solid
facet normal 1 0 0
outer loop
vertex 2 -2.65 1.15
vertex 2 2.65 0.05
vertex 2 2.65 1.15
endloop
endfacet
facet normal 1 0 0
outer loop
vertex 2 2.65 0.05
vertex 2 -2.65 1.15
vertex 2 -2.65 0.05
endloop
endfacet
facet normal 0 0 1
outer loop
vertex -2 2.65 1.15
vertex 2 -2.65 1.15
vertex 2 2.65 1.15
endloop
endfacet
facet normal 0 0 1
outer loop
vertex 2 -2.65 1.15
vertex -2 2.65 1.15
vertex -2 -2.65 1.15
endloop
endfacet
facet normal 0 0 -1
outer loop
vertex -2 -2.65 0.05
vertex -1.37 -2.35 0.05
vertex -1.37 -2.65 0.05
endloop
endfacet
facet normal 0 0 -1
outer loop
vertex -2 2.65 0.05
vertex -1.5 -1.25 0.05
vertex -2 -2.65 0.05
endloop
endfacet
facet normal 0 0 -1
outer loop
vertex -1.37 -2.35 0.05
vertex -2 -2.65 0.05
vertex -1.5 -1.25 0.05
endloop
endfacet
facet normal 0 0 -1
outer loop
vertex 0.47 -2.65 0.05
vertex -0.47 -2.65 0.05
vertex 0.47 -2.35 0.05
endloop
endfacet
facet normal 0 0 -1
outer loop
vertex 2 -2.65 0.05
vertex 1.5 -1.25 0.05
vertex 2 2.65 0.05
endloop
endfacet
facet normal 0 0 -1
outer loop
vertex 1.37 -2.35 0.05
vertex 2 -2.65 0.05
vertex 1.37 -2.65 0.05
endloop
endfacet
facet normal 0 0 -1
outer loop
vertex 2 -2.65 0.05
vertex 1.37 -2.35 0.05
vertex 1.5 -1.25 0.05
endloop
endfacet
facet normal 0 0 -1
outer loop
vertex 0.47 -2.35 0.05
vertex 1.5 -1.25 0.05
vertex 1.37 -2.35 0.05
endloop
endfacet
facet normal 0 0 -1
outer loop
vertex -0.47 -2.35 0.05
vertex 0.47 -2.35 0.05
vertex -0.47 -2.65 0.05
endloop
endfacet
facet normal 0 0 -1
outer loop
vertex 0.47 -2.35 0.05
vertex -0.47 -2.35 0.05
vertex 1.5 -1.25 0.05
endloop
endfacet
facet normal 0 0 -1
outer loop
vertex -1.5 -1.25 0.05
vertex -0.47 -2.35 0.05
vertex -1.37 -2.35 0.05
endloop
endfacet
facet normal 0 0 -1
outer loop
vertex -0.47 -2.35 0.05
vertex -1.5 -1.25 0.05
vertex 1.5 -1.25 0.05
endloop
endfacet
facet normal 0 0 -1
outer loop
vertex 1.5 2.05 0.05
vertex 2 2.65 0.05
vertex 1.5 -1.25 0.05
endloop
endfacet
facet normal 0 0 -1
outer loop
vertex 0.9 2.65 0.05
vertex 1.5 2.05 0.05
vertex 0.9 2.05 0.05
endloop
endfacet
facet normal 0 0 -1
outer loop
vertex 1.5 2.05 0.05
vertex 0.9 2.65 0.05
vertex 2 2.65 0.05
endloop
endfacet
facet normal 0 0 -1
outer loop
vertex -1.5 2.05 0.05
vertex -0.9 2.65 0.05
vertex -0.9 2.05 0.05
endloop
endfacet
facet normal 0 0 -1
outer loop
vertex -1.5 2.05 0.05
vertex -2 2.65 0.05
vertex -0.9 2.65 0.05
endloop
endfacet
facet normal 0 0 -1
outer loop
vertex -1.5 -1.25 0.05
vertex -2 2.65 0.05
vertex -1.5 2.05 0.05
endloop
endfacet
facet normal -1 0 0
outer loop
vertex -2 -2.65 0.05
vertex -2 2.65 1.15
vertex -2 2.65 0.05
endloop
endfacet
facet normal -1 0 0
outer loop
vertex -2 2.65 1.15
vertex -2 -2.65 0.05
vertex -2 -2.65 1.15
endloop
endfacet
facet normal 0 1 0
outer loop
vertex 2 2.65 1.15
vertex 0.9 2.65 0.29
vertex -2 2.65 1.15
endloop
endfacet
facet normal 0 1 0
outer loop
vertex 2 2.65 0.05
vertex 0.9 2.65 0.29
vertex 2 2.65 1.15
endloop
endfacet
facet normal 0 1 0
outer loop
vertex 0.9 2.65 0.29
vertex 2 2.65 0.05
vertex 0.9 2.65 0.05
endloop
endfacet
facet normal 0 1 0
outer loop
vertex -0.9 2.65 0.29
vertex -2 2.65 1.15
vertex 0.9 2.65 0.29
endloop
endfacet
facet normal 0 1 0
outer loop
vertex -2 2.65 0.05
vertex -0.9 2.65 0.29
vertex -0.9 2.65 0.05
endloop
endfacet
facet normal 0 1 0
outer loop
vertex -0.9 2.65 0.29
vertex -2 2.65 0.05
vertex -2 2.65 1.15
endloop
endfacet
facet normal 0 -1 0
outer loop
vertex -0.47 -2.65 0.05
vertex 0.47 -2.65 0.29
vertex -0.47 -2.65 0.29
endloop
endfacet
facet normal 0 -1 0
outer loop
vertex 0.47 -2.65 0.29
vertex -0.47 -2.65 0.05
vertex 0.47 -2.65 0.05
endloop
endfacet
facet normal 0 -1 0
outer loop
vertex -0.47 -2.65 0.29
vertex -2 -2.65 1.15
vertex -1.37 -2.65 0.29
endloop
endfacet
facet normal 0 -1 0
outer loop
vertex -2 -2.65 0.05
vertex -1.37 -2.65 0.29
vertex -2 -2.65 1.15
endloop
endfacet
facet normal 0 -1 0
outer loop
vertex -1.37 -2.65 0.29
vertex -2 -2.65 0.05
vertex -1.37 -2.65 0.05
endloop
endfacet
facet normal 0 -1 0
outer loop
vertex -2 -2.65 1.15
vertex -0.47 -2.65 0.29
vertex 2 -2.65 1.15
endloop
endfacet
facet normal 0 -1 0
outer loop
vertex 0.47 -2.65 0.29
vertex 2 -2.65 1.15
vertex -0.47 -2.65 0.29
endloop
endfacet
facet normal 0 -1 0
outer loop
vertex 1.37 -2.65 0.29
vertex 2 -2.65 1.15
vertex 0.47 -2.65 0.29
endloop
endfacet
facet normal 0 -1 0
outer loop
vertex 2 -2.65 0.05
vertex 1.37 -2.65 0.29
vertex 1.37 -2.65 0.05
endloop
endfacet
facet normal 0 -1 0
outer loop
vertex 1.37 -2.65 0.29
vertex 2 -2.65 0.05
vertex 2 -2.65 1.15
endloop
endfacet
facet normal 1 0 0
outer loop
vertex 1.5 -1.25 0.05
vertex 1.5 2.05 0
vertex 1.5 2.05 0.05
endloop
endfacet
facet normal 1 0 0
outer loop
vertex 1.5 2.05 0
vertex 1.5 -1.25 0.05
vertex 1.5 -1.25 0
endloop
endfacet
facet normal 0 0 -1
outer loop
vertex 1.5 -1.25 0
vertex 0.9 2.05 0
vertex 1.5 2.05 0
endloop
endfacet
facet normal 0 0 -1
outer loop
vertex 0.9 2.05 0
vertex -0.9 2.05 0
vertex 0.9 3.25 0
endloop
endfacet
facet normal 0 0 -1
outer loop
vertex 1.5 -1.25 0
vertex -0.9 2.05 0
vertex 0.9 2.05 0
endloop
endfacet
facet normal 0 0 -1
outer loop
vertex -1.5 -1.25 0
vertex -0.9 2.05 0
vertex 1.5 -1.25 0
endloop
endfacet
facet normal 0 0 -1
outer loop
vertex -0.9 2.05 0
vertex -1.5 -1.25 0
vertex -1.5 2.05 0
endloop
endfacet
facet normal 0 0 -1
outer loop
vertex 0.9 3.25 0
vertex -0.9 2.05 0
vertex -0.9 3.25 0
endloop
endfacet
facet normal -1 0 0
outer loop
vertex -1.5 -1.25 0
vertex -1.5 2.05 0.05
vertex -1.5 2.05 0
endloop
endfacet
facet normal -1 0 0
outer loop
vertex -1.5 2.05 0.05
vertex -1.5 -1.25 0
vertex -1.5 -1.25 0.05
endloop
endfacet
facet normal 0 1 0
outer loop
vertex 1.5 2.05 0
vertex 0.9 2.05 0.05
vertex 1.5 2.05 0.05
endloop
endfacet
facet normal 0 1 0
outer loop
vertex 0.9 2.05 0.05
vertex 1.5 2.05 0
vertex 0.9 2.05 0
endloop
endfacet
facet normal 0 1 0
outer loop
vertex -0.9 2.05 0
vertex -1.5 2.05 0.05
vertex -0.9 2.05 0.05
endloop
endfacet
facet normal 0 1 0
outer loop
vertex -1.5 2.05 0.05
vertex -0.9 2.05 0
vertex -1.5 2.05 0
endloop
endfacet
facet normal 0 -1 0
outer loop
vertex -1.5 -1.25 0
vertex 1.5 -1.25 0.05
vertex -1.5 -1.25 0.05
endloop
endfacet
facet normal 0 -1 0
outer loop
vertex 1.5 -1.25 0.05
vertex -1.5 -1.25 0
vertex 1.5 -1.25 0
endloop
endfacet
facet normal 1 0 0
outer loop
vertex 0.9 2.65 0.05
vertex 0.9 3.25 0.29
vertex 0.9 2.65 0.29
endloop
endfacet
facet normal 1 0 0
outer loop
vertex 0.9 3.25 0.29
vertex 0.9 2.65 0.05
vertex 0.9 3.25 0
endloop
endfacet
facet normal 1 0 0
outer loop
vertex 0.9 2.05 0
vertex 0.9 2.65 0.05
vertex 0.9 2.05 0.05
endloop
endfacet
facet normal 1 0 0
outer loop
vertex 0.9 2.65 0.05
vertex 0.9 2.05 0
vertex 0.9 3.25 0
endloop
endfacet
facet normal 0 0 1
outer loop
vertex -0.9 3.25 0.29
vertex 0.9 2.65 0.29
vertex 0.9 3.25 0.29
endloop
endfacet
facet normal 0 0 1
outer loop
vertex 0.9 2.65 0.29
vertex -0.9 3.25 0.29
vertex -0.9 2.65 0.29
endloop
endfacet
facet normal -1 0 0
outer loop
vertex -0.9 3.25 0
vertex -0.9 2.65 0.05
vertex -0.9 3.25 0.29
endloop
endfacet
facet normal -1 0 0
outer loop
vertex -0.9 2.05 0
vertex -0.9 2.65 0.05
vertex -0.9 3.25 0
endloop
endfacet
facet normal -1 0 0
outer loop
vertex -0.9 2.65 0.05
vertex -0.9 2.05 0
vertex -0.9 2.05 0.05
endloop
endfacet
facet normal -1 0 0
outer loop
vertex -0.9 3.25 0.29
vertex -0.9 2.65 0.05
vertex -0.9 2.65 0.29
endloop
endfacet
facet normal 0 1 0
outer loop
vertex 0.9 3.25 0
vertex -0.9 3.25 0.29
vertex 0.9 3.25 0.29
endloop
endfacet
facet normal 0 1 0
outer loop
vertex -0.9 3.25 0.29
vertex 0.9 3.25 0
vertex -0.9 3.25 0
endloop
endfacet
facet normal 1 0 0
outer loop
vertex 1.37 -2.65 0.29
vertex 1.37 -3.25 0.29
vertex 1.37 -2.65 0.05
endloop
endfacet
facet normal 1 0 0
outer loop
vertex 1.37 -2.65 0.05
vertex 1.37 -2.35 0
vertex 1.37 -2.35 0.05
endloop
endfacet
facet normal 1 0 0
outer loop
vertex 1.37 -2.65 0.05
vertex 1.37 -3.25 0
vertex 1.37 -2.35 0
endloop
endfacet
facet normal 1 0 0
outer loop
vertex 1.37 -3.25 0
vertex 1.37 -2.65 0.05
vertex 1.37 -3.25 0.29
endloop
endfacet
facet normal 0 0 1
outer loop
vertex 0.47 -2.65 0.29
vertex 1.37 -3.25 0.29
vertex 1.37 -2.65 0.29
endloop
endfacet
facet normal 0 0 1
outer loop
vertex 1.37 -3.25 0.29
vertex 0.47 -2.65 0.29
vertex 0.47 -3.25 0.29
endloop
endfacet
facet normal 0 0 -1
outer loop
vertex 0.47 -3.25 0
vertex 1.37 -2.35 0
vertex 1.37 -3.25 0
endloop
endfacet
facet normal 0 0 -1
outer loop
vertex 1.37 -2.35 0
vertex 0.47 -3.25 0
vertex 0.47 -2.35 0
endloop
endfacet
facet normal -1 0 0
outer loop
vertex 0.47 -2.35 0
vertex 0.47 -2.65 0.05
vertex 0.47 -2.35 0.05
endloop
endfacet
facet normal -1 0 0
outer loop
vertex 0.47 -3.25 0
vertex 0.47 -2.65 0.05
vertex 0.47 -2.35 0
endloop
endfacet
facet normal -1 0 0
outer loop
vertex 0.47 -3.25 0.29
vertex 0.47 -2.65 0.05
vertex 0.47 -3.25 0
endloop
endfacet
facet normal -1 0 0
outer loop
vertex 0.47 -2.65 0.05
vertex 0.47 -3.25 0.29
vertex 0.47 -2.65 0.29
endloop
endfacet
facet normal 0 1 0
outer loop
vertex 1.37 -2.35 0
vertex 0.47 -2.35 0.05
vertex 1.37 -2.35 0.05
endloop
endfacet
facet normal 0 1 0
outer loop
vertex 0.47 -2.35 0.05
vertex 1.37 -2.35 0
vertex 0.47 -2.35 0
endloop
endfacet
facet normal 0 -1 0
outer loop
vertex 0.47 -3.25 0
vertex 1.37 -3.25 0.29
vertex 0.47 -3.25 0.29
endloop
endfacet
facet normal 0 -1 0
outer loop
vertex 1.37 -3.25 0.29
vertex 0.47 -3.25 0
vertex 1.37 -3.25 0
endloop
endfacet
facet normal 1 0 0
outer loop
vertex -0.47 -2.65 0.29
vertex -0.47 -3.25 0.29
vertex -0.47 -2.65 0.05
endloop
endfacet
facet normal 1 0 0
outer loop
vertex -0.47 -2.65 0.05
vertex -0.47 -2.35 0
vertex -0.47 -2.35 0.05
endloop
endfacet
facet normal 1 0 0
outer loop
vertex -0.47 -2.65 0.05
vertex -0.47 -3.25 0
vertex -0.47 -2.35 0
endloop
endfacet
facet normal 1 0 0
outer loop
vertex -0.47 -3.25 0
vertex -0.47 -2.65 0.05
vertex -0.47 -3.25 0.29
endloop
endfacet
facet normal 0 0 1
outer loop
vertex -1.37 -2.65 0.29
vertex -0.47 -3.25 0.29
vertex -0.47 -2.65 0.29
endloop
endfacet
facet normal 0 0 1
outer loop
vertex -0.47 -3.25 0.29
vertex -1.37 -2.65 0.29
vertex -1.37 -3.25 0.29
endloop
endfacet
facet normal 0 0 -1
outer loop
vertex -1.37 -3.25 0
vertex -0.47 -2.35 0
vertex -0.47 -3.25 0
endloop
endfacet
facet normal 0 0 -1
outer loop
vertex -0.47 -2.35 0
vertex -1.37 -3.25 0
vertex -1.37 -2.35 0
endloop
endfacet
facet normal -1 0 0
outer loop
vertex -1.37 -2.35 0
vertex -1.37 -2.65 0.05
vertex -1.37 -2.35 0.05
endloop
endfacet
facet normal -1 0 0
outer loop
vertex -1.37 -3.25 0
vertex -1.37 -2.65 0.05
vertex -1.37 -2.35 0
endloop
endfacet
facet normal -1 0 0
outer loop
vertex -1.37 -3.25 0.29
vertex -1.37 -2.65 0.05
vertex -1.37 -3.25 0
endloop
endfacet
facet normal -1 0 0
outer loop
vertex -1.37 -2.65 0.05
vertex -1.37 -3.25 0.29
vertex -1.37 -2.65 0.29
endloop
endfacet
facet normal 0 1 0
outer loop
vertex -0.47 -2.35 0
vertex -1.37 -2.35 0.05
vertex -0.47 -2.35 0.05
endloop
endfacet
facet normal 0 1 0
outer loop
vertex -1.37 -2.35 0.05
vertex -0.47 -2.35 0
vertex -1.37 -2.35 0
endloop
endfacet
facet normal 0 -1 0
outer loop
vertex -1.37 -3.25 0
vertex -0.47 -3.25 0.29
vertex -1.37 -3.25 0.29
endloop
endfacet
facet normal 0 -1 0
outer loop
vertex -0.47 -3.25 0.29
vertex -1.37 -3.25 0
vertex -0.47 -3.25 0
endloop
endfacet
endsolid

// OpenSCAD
color("black")translate([0,0,1.1/2+0.05])cube([4,5.3, 1.1],true);
color("gray")translate([0,1-0.6,0.29/2])cube([3,3.3, 0.29],true);
color("gray")translate([0,1.15+0.6,0.29/2])cube([1.8,3, 0.29],true);
color("gray")translate([1.84/2,-2.2-0.6,0.29/2])cube([0.9,0.9, 0.29],true);
color("gray")translate([-1.84/2,-2.2-0.6,0.29/2])cube([0.9,0.9, 0.29],true);
